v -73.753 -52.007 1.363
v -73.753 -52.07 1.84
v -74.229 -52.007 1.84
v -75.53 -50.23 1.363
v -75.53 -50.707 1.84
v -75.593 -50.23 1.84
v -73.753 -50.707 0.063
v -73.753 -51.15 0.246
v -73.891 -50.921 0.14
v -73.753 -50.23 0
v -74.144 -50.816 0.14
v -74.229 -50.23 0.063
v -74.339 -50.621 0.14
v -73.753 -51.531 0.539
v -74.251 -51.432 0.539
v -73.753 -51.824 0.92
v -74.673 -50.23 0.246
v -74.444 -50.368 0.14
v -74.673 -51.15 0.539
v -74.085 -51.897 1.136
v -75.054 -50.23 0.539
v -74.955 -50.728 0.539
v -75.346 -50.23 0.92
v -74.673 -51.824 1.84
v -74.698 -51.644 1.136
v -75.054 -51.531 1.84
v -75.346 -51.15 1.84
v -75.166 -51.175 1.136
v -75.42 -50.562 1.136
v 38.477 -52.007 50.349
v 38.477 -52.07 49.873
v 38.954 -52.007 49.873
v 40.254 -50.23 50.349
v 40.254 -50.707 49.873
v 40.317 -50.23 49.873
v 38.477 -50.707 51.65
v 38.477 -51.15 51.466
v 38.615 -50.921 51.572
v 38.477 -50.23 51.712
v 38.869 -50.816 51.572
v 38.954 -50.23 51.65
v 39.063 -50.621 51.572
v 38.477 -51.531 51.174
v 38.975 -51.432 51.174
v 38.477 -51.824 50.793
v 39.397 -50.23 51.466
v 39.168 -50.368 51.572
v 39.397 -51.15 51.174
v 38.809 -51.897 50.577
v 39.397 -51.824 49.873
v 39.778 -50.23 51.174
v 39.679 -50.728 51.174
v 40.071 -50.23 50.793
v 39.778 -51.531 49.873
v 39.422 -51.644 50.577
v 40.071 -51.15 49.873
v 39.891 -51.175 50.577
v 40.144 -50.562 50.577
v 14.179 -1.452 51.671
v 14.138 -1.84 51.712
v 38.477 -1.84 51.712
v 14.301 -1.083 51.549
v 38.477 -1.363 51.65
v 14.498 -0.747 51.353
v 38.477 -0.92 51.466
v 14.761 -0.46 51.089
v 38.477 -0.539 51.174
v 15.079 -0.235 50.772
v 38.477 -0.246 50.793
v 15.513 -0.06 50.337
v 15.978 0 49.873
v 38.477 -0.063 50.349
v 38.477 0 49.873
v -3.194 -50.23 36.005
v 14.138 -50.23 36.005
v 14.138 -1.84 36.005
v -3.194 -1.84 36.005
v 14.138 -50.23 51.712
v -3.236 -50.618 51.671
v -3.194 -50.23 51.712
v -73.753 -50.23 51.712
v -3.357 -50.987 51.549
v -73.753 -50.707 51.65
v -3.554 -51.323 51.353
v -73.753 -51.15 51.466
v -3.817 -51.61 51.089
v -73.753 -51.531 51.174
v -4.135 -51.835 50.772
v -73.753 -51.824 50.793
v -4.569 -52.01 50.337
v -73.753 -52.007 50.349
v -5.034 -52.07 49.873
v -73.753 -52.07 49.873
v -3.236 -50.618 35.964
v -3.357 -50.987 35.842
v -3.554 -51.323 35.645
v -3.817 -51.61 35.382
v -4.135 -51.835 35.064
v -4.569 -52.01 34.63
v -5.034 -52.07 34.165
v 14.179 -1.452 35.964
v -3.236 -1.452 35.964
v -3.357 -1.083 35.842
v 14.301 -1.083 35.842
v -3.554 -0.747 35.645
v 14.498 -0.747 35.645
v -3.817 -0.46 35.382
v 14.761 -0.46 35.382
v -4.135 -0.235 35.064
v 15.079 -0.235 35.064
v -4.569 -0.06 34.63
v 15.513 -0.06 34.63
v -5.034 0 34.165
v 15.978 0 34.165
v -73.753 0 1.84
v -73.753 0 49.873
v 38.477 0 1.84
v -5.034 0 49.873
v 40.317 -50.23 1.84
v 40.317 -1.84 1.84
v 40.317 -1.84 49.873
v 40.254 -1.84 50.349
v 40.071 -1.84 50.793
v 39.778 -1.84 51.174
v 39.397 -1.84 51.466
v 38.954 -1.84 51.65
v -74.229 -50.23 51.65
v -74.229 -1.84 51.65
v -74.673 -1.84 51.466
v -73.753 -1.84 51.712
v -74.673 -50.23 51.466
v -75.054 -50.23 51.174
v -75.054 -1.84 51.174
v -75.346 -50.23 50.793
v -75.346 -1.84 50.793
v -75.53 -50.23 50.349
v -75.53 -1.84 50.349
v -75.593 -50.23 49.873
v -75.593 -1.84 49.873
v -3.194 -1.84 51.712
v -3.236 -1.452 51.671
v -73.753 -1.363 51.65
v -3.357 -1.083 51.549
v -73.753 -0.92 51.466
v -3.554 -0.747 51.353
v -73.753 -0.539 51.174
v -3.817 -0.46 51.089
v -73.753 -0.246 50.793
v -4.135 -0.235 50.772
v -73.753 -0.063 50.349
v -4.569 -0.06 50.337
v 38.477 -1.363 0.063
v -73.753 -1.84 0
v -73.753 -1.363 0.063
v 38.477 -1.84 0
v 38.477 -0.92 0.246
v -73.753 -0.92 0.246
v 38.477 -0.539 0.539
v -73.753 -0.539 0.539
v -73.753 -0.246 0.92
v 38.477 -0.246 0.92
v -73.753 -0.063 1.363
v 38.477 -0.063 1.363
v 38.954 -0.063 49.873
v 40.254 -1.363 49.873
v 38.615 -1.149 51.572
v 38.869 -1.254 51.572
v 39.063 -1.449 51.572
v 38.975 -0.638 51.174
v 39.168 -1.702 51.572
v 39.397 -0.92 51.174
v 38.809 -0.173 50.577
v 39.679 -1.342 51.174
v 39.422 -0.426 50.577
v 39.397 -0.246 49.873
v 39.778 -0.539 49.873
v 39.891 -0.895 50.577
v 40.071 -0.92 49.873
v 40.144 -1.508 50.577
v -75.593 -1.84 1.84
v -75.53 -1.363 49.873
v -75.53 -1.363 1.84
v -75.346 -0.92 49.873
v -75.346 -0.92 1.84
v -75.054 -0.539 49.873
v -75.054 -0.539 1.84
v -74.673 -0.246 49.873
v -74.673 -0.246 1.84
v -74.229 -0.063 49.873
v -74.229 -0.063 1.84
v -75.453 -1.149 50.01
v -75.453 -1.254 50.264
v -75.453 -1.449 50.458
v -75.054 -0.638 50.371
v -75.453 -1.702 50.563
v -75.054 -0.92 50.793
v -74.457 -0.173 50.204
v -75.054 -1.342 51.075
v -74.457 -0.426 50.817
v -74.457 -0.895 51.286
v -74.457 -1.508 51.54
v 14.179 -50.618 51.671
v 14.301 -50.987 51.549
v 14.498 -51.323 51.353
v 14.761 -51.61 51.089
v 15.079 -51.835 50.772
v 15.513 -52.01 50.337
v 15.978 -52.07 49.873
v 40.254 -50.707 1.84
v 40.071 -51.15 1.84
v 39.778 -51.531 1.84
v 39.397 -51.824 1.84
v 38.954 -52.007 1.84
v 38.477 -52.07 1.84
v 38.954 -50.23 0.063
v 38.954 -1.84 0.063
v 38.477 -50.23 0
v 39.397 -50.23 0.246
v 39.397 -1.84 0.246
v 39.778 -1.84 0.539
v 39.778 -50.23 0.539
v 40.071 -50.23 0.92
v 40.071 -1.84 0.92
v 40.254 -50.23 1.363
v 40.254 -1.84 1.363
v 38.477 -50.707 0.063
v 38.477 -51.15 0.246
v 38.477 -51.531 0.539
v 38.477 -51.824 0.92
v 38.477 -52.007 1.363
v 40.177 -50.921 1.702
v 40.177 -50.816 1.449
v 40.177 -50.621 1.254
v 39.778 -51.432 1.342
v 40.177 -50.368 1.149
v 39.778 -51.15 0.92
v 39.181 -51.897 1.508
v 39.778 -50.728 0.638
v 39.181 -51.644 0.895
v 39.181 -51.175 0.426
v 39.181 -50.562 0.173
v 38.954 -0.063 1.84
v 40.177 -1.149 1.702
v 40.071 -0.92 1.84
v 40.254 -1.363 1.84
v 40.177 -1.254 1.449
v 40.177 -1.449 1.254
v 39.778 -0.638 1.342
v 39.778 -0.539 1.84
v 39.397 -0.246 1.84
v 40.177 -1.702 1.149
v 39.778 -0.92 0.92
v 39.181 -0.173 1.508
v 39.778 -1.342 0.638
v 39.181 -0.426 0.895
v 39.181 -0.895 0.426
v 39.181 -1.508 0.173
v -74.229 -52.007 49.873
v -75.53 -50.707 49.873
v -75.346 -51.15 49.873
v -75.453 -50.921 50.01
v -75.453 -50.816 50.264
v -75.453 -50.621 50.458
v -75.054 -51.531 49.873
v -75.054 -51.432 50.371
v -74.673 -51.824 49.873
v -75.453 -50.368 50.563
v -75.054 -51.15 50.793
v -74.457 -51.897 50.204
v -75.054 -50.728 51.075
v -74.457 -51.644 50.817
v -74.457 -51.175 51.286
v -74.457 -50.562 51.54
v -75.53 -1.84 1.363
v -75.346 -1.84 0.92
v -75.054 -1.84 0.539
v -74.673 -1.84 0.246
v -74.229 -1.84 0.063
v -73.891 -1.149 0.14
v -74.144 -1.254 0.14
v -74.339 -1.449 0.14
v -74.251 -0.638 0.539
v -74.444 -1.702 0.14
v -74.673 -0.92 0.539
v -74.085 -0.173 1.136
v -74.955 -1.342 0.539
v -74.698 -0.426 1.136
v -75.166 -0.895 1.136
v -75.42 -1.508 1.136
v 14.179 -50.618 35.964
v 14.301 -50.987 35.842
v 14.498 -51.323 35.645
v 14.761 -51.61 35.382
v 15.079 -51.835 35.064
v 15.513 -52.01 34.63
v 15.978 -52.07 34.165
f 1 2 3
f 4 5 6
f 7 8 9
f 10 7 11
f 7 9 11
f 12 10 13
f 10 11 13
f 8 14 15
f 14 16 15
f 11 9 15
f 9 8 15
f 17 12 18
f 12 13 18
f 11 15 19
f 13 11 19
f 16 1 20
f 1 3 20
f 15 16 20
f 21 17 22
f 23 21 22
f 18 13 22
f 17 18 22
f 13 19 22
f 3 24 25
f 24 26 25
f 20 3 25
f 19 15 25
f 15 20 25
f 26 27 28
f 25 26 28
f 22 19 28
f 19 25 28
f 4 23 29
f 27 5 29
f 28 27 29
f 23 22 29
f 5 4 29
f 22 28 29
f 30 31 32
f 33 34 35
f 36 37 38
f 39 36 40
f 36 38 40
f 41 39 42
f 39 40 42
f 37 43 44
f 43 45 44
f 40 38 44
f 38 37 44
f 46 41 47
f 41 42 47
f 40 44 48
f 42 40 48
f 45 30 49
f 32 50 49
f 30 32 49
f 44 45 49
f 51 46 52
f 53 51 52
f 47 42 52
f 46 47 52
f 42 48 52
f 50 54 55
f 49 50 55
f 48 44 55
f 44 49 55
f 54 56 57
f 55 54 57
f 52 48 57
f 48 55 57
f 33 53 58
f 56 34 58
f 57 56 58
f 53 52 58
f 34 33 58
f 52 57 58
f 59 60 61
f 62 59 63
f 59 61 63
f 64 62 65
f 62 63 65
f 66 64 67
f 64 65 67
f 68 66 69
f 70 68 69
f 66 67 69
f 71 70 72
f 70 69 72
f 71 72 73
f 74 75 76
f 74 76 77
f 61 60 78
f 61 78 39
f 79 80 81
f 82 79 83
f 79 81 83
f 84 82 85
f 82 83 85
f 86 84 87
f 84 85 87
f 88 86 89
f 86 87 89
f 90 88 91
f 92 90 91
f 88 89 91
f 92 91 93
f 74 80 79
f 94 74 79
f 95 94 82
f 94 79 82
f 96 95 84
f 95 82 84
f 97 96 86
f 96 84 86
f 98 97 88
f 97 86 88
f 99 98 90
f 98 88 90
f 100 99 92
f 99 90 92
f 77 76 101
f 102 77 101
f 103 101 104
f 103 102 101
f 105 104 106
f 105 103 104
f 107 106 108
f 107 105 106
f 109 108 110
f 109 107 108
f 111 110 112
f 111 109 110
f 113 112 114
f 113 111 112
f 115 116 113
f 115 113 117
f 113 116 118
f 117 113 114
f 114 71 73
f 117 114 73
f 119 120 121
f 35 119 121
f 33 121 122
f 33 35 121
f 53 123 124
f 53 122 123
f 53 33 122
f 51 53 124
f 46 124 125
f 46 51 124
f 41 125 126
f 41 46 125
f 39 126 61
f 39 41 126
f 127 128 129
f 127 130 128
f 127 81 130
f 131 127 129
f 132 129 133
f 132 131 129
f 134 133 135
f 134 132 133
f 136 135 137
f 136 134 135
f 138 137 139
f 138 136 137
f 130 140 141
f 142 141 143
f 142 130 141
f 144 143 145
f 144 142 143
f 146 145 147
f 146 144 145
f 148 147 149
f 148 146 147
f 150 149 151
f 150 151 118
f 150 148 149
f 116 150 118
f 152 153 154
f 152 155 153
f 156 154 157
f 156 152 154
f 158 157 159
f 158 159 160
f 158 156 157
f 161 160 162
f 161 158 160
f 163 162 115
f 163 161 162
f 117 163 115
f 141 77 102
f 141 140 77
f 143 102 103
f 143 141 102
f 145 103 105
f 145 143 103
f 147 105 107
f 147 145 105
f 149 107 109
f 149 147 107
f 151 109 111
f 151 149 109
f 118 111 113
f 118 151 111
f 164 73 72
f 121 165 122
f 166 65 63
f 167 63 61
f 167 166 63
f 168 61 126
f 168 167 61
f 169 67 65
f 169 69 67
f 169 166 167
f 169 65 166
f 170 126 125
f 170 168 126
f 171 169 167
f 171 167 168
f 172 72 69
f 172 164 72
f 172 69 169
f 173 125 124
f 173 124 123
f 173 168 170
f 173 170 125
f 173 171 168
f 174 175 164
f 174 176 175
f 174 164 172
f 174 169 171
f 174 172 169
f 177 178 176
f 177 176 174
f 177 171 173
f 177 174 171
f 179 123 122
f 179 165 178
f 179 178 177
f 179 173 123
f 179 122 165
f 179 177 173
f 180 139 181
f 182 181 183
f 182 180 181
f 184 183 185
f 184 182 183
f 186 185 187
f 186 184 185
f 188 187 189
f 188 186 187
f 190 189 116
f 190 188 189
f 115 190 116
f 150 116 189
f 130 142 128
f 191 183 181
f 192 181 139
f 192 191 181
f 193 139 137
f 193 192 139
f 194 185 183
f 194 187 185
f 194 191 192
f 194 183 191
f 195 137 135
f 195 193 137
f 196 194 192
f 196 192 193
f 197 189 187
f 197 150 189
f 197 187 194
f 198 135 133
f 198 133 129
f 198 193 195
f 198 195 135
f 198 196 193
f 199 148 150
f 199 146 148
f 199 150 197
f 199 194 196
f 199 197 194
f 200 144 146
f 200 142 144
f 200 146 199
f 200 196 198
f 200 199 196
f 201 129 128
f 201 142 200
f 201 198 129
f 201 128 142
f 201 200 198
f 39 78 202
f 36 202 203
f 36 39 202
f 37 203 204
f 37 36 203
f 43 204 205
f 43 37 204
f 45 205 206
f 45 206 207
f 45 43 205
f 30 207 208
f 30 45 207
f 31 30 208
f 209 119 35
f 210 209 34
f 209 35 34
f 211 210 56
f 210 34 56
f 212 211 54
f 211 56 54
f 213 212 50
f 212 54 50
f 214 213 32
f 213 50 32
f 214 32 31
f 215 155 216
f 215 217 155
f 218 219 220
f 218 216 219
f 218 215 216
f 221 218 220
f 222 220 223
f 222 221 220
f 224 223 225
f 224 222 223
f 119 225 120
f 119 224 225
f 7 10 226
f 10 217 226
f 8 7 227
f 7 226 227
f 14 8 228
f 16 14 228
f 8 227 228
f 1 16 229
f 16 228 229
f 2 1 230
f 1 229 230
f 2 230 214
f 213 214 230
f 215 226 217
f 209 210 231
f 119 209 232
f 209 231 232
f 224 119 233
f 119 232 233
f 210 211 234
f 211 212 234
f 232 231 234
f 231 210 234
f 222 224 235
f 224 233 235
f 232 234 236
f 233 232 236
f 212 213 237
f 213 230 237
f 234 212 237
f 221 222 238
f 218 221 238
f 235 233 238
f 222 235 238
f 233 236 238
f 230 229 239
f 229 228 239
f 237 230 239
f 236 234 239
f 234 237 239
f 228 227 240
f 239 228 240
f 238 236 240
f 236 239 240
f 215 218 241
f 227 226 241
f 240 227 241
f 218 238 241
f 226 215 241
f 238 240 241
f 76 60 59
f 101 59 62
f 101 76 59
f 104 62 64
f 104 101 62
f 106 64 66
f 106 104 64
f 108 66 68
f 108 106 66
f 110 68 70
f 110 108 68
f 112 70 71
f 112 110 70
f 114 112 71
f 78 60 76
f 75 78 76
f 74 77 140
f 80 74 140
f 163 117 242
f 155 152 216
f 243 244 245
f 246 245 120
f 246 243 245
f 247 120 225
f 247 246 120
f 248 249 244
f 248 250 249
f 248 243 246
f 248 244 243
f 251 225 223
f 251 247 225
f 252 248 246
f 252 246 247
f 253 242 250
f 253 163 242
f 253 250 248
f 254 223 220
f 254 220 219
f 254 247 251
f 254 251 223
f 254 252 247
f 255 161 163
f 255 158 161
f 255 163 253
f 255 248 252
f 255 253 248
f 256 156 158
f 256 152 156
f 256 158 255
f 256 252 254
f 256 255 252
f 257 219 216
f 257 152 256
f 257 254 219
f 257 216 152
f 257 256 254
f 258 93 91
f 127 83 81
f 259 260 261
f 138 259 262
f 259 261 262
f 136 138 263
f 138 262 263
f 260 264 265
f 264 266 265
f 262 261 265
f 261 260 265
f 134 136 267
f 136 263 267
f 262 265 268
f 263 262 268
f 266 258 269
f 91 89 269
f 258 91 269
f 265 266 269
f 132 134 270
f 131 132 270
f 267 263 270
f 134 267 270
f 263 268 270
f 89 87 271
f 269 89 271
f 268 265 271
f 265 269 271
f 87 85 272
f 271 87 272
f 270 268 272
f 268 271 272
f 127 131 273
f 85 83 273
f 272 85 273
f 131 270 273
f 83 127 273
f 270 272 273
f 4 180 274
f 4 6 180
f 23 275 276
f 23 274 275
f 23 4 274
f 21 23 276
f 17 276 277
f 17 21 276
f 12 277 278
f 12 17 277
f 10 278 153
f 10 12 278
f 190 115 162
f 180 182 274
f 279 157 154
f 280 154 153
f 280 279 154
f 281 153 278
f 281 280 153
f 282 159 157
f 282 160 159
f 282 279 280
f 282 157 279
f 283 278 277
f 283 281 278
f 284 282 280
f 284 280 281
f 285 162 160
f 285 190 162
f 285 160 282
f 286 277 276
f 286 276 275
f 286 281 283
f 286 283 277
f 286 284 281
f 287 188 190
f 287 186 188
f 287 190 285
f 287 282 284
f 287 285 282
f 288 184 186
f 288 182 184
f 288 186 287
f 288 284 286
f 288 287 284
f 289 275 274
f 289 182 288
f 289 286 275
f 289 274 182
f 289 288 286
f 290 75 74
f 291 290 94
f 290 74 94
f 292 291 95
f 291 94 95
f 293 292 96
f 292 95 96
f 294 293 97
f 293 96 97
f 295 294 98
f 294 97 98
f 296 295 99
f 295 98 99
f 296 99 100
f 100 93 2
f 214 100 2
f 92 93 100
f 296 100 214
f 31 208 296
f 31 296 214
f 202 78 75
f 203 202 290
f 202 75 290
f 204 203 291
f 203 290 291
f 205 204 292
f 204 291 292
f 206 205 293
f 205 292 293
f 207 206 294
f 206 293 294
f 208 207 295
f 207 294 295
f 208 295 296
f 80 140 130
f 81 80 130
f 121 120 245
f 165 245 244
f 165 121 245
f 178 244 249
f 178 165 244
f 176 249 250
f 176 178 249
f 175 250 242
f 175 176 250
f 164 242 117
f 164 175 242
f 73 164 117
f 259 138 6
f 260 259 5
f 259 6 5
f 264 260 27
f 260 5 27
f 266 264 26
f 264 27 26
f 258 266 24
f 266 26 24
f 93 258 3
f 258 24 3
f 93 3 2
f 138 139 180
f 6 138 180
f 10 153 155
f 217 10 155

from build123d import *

# Parameters (mm, degrees)
F0_W     = 26.1790351942
F0_H     = 15.7074220479
F0_H_2   = 36.0050015152
F0_W_2   = 25.6373991724
F1_DEPTH = 52.07
F2_R     = 1.8396307345


with BuildPart() as f1:
    # F0 (on Front) → F1 (new body)
    with BuildSketch(Plane.XZ):
        with Locations((27.227526065, 43.8587125391)):
            Rectangle(F0_W, F0_H)
        with Locations((27.227526065, 18.0025007576)):
            Rectangle(F0_W, F0_H_2)
        Polygon((-28.8317184895, 36.0050015152), (-28.8317184895, 0), (14.1380084679, 0), (14.1380084679, 36.0050015152), (-3.1943193171, 36.0050015152), align=None)
        with Locations((-16.0130189033, 43.8587125391)):
            Rectangle(F0_W_2, F0_H)
        Polygon((-75.5928903818, 51.712423563), (-75.5928903818, 0), (-28.8317184895, 0), (-28.8317184895, 36.0050015152), (-28.8317184895, 51.712423563), align=None)
    extrude(amount=F1_DEPTH)

    # F2
    f2_edges = [f1.edges().sort_by_distance(p)[0] for p in [
        (14.138008, 0, 43.858713),
        (5.471845, 0, 36.005002),
        (-3.194319, 0, 43.858713),
        (-39.393605, 0, 51.712424),
        (-75.59289, 0, 25.856212),
        (-17.637923, 0, 0),
        (40.317044, 0, 25.856212),
        (27.227526, 0, 51.712424),
        (14.138008, -52.07, 43.858713),
        (5.471845, -52.07, 36.005002),
        (-3.194319, -52.07, 43.858713),
        (-39.393605, -52.07, 51.712424),
        (-75.59289, -52.07, 25.856212),
        (-17.637923, -52.07, 0),
        (40.317044, -52.07, 25.856212),
        (27.227526, -52.07, 51.712424),
        (40.317044, -26.035, 0),
        (40.317044, -26.035, 51.712424),
        (-75.59289, -26.035, 51.712424),
        (-75.59289, -26.035, 0),
    ]]
    fillet(f2_edges, radius=F2_R)


solid = f1.part
